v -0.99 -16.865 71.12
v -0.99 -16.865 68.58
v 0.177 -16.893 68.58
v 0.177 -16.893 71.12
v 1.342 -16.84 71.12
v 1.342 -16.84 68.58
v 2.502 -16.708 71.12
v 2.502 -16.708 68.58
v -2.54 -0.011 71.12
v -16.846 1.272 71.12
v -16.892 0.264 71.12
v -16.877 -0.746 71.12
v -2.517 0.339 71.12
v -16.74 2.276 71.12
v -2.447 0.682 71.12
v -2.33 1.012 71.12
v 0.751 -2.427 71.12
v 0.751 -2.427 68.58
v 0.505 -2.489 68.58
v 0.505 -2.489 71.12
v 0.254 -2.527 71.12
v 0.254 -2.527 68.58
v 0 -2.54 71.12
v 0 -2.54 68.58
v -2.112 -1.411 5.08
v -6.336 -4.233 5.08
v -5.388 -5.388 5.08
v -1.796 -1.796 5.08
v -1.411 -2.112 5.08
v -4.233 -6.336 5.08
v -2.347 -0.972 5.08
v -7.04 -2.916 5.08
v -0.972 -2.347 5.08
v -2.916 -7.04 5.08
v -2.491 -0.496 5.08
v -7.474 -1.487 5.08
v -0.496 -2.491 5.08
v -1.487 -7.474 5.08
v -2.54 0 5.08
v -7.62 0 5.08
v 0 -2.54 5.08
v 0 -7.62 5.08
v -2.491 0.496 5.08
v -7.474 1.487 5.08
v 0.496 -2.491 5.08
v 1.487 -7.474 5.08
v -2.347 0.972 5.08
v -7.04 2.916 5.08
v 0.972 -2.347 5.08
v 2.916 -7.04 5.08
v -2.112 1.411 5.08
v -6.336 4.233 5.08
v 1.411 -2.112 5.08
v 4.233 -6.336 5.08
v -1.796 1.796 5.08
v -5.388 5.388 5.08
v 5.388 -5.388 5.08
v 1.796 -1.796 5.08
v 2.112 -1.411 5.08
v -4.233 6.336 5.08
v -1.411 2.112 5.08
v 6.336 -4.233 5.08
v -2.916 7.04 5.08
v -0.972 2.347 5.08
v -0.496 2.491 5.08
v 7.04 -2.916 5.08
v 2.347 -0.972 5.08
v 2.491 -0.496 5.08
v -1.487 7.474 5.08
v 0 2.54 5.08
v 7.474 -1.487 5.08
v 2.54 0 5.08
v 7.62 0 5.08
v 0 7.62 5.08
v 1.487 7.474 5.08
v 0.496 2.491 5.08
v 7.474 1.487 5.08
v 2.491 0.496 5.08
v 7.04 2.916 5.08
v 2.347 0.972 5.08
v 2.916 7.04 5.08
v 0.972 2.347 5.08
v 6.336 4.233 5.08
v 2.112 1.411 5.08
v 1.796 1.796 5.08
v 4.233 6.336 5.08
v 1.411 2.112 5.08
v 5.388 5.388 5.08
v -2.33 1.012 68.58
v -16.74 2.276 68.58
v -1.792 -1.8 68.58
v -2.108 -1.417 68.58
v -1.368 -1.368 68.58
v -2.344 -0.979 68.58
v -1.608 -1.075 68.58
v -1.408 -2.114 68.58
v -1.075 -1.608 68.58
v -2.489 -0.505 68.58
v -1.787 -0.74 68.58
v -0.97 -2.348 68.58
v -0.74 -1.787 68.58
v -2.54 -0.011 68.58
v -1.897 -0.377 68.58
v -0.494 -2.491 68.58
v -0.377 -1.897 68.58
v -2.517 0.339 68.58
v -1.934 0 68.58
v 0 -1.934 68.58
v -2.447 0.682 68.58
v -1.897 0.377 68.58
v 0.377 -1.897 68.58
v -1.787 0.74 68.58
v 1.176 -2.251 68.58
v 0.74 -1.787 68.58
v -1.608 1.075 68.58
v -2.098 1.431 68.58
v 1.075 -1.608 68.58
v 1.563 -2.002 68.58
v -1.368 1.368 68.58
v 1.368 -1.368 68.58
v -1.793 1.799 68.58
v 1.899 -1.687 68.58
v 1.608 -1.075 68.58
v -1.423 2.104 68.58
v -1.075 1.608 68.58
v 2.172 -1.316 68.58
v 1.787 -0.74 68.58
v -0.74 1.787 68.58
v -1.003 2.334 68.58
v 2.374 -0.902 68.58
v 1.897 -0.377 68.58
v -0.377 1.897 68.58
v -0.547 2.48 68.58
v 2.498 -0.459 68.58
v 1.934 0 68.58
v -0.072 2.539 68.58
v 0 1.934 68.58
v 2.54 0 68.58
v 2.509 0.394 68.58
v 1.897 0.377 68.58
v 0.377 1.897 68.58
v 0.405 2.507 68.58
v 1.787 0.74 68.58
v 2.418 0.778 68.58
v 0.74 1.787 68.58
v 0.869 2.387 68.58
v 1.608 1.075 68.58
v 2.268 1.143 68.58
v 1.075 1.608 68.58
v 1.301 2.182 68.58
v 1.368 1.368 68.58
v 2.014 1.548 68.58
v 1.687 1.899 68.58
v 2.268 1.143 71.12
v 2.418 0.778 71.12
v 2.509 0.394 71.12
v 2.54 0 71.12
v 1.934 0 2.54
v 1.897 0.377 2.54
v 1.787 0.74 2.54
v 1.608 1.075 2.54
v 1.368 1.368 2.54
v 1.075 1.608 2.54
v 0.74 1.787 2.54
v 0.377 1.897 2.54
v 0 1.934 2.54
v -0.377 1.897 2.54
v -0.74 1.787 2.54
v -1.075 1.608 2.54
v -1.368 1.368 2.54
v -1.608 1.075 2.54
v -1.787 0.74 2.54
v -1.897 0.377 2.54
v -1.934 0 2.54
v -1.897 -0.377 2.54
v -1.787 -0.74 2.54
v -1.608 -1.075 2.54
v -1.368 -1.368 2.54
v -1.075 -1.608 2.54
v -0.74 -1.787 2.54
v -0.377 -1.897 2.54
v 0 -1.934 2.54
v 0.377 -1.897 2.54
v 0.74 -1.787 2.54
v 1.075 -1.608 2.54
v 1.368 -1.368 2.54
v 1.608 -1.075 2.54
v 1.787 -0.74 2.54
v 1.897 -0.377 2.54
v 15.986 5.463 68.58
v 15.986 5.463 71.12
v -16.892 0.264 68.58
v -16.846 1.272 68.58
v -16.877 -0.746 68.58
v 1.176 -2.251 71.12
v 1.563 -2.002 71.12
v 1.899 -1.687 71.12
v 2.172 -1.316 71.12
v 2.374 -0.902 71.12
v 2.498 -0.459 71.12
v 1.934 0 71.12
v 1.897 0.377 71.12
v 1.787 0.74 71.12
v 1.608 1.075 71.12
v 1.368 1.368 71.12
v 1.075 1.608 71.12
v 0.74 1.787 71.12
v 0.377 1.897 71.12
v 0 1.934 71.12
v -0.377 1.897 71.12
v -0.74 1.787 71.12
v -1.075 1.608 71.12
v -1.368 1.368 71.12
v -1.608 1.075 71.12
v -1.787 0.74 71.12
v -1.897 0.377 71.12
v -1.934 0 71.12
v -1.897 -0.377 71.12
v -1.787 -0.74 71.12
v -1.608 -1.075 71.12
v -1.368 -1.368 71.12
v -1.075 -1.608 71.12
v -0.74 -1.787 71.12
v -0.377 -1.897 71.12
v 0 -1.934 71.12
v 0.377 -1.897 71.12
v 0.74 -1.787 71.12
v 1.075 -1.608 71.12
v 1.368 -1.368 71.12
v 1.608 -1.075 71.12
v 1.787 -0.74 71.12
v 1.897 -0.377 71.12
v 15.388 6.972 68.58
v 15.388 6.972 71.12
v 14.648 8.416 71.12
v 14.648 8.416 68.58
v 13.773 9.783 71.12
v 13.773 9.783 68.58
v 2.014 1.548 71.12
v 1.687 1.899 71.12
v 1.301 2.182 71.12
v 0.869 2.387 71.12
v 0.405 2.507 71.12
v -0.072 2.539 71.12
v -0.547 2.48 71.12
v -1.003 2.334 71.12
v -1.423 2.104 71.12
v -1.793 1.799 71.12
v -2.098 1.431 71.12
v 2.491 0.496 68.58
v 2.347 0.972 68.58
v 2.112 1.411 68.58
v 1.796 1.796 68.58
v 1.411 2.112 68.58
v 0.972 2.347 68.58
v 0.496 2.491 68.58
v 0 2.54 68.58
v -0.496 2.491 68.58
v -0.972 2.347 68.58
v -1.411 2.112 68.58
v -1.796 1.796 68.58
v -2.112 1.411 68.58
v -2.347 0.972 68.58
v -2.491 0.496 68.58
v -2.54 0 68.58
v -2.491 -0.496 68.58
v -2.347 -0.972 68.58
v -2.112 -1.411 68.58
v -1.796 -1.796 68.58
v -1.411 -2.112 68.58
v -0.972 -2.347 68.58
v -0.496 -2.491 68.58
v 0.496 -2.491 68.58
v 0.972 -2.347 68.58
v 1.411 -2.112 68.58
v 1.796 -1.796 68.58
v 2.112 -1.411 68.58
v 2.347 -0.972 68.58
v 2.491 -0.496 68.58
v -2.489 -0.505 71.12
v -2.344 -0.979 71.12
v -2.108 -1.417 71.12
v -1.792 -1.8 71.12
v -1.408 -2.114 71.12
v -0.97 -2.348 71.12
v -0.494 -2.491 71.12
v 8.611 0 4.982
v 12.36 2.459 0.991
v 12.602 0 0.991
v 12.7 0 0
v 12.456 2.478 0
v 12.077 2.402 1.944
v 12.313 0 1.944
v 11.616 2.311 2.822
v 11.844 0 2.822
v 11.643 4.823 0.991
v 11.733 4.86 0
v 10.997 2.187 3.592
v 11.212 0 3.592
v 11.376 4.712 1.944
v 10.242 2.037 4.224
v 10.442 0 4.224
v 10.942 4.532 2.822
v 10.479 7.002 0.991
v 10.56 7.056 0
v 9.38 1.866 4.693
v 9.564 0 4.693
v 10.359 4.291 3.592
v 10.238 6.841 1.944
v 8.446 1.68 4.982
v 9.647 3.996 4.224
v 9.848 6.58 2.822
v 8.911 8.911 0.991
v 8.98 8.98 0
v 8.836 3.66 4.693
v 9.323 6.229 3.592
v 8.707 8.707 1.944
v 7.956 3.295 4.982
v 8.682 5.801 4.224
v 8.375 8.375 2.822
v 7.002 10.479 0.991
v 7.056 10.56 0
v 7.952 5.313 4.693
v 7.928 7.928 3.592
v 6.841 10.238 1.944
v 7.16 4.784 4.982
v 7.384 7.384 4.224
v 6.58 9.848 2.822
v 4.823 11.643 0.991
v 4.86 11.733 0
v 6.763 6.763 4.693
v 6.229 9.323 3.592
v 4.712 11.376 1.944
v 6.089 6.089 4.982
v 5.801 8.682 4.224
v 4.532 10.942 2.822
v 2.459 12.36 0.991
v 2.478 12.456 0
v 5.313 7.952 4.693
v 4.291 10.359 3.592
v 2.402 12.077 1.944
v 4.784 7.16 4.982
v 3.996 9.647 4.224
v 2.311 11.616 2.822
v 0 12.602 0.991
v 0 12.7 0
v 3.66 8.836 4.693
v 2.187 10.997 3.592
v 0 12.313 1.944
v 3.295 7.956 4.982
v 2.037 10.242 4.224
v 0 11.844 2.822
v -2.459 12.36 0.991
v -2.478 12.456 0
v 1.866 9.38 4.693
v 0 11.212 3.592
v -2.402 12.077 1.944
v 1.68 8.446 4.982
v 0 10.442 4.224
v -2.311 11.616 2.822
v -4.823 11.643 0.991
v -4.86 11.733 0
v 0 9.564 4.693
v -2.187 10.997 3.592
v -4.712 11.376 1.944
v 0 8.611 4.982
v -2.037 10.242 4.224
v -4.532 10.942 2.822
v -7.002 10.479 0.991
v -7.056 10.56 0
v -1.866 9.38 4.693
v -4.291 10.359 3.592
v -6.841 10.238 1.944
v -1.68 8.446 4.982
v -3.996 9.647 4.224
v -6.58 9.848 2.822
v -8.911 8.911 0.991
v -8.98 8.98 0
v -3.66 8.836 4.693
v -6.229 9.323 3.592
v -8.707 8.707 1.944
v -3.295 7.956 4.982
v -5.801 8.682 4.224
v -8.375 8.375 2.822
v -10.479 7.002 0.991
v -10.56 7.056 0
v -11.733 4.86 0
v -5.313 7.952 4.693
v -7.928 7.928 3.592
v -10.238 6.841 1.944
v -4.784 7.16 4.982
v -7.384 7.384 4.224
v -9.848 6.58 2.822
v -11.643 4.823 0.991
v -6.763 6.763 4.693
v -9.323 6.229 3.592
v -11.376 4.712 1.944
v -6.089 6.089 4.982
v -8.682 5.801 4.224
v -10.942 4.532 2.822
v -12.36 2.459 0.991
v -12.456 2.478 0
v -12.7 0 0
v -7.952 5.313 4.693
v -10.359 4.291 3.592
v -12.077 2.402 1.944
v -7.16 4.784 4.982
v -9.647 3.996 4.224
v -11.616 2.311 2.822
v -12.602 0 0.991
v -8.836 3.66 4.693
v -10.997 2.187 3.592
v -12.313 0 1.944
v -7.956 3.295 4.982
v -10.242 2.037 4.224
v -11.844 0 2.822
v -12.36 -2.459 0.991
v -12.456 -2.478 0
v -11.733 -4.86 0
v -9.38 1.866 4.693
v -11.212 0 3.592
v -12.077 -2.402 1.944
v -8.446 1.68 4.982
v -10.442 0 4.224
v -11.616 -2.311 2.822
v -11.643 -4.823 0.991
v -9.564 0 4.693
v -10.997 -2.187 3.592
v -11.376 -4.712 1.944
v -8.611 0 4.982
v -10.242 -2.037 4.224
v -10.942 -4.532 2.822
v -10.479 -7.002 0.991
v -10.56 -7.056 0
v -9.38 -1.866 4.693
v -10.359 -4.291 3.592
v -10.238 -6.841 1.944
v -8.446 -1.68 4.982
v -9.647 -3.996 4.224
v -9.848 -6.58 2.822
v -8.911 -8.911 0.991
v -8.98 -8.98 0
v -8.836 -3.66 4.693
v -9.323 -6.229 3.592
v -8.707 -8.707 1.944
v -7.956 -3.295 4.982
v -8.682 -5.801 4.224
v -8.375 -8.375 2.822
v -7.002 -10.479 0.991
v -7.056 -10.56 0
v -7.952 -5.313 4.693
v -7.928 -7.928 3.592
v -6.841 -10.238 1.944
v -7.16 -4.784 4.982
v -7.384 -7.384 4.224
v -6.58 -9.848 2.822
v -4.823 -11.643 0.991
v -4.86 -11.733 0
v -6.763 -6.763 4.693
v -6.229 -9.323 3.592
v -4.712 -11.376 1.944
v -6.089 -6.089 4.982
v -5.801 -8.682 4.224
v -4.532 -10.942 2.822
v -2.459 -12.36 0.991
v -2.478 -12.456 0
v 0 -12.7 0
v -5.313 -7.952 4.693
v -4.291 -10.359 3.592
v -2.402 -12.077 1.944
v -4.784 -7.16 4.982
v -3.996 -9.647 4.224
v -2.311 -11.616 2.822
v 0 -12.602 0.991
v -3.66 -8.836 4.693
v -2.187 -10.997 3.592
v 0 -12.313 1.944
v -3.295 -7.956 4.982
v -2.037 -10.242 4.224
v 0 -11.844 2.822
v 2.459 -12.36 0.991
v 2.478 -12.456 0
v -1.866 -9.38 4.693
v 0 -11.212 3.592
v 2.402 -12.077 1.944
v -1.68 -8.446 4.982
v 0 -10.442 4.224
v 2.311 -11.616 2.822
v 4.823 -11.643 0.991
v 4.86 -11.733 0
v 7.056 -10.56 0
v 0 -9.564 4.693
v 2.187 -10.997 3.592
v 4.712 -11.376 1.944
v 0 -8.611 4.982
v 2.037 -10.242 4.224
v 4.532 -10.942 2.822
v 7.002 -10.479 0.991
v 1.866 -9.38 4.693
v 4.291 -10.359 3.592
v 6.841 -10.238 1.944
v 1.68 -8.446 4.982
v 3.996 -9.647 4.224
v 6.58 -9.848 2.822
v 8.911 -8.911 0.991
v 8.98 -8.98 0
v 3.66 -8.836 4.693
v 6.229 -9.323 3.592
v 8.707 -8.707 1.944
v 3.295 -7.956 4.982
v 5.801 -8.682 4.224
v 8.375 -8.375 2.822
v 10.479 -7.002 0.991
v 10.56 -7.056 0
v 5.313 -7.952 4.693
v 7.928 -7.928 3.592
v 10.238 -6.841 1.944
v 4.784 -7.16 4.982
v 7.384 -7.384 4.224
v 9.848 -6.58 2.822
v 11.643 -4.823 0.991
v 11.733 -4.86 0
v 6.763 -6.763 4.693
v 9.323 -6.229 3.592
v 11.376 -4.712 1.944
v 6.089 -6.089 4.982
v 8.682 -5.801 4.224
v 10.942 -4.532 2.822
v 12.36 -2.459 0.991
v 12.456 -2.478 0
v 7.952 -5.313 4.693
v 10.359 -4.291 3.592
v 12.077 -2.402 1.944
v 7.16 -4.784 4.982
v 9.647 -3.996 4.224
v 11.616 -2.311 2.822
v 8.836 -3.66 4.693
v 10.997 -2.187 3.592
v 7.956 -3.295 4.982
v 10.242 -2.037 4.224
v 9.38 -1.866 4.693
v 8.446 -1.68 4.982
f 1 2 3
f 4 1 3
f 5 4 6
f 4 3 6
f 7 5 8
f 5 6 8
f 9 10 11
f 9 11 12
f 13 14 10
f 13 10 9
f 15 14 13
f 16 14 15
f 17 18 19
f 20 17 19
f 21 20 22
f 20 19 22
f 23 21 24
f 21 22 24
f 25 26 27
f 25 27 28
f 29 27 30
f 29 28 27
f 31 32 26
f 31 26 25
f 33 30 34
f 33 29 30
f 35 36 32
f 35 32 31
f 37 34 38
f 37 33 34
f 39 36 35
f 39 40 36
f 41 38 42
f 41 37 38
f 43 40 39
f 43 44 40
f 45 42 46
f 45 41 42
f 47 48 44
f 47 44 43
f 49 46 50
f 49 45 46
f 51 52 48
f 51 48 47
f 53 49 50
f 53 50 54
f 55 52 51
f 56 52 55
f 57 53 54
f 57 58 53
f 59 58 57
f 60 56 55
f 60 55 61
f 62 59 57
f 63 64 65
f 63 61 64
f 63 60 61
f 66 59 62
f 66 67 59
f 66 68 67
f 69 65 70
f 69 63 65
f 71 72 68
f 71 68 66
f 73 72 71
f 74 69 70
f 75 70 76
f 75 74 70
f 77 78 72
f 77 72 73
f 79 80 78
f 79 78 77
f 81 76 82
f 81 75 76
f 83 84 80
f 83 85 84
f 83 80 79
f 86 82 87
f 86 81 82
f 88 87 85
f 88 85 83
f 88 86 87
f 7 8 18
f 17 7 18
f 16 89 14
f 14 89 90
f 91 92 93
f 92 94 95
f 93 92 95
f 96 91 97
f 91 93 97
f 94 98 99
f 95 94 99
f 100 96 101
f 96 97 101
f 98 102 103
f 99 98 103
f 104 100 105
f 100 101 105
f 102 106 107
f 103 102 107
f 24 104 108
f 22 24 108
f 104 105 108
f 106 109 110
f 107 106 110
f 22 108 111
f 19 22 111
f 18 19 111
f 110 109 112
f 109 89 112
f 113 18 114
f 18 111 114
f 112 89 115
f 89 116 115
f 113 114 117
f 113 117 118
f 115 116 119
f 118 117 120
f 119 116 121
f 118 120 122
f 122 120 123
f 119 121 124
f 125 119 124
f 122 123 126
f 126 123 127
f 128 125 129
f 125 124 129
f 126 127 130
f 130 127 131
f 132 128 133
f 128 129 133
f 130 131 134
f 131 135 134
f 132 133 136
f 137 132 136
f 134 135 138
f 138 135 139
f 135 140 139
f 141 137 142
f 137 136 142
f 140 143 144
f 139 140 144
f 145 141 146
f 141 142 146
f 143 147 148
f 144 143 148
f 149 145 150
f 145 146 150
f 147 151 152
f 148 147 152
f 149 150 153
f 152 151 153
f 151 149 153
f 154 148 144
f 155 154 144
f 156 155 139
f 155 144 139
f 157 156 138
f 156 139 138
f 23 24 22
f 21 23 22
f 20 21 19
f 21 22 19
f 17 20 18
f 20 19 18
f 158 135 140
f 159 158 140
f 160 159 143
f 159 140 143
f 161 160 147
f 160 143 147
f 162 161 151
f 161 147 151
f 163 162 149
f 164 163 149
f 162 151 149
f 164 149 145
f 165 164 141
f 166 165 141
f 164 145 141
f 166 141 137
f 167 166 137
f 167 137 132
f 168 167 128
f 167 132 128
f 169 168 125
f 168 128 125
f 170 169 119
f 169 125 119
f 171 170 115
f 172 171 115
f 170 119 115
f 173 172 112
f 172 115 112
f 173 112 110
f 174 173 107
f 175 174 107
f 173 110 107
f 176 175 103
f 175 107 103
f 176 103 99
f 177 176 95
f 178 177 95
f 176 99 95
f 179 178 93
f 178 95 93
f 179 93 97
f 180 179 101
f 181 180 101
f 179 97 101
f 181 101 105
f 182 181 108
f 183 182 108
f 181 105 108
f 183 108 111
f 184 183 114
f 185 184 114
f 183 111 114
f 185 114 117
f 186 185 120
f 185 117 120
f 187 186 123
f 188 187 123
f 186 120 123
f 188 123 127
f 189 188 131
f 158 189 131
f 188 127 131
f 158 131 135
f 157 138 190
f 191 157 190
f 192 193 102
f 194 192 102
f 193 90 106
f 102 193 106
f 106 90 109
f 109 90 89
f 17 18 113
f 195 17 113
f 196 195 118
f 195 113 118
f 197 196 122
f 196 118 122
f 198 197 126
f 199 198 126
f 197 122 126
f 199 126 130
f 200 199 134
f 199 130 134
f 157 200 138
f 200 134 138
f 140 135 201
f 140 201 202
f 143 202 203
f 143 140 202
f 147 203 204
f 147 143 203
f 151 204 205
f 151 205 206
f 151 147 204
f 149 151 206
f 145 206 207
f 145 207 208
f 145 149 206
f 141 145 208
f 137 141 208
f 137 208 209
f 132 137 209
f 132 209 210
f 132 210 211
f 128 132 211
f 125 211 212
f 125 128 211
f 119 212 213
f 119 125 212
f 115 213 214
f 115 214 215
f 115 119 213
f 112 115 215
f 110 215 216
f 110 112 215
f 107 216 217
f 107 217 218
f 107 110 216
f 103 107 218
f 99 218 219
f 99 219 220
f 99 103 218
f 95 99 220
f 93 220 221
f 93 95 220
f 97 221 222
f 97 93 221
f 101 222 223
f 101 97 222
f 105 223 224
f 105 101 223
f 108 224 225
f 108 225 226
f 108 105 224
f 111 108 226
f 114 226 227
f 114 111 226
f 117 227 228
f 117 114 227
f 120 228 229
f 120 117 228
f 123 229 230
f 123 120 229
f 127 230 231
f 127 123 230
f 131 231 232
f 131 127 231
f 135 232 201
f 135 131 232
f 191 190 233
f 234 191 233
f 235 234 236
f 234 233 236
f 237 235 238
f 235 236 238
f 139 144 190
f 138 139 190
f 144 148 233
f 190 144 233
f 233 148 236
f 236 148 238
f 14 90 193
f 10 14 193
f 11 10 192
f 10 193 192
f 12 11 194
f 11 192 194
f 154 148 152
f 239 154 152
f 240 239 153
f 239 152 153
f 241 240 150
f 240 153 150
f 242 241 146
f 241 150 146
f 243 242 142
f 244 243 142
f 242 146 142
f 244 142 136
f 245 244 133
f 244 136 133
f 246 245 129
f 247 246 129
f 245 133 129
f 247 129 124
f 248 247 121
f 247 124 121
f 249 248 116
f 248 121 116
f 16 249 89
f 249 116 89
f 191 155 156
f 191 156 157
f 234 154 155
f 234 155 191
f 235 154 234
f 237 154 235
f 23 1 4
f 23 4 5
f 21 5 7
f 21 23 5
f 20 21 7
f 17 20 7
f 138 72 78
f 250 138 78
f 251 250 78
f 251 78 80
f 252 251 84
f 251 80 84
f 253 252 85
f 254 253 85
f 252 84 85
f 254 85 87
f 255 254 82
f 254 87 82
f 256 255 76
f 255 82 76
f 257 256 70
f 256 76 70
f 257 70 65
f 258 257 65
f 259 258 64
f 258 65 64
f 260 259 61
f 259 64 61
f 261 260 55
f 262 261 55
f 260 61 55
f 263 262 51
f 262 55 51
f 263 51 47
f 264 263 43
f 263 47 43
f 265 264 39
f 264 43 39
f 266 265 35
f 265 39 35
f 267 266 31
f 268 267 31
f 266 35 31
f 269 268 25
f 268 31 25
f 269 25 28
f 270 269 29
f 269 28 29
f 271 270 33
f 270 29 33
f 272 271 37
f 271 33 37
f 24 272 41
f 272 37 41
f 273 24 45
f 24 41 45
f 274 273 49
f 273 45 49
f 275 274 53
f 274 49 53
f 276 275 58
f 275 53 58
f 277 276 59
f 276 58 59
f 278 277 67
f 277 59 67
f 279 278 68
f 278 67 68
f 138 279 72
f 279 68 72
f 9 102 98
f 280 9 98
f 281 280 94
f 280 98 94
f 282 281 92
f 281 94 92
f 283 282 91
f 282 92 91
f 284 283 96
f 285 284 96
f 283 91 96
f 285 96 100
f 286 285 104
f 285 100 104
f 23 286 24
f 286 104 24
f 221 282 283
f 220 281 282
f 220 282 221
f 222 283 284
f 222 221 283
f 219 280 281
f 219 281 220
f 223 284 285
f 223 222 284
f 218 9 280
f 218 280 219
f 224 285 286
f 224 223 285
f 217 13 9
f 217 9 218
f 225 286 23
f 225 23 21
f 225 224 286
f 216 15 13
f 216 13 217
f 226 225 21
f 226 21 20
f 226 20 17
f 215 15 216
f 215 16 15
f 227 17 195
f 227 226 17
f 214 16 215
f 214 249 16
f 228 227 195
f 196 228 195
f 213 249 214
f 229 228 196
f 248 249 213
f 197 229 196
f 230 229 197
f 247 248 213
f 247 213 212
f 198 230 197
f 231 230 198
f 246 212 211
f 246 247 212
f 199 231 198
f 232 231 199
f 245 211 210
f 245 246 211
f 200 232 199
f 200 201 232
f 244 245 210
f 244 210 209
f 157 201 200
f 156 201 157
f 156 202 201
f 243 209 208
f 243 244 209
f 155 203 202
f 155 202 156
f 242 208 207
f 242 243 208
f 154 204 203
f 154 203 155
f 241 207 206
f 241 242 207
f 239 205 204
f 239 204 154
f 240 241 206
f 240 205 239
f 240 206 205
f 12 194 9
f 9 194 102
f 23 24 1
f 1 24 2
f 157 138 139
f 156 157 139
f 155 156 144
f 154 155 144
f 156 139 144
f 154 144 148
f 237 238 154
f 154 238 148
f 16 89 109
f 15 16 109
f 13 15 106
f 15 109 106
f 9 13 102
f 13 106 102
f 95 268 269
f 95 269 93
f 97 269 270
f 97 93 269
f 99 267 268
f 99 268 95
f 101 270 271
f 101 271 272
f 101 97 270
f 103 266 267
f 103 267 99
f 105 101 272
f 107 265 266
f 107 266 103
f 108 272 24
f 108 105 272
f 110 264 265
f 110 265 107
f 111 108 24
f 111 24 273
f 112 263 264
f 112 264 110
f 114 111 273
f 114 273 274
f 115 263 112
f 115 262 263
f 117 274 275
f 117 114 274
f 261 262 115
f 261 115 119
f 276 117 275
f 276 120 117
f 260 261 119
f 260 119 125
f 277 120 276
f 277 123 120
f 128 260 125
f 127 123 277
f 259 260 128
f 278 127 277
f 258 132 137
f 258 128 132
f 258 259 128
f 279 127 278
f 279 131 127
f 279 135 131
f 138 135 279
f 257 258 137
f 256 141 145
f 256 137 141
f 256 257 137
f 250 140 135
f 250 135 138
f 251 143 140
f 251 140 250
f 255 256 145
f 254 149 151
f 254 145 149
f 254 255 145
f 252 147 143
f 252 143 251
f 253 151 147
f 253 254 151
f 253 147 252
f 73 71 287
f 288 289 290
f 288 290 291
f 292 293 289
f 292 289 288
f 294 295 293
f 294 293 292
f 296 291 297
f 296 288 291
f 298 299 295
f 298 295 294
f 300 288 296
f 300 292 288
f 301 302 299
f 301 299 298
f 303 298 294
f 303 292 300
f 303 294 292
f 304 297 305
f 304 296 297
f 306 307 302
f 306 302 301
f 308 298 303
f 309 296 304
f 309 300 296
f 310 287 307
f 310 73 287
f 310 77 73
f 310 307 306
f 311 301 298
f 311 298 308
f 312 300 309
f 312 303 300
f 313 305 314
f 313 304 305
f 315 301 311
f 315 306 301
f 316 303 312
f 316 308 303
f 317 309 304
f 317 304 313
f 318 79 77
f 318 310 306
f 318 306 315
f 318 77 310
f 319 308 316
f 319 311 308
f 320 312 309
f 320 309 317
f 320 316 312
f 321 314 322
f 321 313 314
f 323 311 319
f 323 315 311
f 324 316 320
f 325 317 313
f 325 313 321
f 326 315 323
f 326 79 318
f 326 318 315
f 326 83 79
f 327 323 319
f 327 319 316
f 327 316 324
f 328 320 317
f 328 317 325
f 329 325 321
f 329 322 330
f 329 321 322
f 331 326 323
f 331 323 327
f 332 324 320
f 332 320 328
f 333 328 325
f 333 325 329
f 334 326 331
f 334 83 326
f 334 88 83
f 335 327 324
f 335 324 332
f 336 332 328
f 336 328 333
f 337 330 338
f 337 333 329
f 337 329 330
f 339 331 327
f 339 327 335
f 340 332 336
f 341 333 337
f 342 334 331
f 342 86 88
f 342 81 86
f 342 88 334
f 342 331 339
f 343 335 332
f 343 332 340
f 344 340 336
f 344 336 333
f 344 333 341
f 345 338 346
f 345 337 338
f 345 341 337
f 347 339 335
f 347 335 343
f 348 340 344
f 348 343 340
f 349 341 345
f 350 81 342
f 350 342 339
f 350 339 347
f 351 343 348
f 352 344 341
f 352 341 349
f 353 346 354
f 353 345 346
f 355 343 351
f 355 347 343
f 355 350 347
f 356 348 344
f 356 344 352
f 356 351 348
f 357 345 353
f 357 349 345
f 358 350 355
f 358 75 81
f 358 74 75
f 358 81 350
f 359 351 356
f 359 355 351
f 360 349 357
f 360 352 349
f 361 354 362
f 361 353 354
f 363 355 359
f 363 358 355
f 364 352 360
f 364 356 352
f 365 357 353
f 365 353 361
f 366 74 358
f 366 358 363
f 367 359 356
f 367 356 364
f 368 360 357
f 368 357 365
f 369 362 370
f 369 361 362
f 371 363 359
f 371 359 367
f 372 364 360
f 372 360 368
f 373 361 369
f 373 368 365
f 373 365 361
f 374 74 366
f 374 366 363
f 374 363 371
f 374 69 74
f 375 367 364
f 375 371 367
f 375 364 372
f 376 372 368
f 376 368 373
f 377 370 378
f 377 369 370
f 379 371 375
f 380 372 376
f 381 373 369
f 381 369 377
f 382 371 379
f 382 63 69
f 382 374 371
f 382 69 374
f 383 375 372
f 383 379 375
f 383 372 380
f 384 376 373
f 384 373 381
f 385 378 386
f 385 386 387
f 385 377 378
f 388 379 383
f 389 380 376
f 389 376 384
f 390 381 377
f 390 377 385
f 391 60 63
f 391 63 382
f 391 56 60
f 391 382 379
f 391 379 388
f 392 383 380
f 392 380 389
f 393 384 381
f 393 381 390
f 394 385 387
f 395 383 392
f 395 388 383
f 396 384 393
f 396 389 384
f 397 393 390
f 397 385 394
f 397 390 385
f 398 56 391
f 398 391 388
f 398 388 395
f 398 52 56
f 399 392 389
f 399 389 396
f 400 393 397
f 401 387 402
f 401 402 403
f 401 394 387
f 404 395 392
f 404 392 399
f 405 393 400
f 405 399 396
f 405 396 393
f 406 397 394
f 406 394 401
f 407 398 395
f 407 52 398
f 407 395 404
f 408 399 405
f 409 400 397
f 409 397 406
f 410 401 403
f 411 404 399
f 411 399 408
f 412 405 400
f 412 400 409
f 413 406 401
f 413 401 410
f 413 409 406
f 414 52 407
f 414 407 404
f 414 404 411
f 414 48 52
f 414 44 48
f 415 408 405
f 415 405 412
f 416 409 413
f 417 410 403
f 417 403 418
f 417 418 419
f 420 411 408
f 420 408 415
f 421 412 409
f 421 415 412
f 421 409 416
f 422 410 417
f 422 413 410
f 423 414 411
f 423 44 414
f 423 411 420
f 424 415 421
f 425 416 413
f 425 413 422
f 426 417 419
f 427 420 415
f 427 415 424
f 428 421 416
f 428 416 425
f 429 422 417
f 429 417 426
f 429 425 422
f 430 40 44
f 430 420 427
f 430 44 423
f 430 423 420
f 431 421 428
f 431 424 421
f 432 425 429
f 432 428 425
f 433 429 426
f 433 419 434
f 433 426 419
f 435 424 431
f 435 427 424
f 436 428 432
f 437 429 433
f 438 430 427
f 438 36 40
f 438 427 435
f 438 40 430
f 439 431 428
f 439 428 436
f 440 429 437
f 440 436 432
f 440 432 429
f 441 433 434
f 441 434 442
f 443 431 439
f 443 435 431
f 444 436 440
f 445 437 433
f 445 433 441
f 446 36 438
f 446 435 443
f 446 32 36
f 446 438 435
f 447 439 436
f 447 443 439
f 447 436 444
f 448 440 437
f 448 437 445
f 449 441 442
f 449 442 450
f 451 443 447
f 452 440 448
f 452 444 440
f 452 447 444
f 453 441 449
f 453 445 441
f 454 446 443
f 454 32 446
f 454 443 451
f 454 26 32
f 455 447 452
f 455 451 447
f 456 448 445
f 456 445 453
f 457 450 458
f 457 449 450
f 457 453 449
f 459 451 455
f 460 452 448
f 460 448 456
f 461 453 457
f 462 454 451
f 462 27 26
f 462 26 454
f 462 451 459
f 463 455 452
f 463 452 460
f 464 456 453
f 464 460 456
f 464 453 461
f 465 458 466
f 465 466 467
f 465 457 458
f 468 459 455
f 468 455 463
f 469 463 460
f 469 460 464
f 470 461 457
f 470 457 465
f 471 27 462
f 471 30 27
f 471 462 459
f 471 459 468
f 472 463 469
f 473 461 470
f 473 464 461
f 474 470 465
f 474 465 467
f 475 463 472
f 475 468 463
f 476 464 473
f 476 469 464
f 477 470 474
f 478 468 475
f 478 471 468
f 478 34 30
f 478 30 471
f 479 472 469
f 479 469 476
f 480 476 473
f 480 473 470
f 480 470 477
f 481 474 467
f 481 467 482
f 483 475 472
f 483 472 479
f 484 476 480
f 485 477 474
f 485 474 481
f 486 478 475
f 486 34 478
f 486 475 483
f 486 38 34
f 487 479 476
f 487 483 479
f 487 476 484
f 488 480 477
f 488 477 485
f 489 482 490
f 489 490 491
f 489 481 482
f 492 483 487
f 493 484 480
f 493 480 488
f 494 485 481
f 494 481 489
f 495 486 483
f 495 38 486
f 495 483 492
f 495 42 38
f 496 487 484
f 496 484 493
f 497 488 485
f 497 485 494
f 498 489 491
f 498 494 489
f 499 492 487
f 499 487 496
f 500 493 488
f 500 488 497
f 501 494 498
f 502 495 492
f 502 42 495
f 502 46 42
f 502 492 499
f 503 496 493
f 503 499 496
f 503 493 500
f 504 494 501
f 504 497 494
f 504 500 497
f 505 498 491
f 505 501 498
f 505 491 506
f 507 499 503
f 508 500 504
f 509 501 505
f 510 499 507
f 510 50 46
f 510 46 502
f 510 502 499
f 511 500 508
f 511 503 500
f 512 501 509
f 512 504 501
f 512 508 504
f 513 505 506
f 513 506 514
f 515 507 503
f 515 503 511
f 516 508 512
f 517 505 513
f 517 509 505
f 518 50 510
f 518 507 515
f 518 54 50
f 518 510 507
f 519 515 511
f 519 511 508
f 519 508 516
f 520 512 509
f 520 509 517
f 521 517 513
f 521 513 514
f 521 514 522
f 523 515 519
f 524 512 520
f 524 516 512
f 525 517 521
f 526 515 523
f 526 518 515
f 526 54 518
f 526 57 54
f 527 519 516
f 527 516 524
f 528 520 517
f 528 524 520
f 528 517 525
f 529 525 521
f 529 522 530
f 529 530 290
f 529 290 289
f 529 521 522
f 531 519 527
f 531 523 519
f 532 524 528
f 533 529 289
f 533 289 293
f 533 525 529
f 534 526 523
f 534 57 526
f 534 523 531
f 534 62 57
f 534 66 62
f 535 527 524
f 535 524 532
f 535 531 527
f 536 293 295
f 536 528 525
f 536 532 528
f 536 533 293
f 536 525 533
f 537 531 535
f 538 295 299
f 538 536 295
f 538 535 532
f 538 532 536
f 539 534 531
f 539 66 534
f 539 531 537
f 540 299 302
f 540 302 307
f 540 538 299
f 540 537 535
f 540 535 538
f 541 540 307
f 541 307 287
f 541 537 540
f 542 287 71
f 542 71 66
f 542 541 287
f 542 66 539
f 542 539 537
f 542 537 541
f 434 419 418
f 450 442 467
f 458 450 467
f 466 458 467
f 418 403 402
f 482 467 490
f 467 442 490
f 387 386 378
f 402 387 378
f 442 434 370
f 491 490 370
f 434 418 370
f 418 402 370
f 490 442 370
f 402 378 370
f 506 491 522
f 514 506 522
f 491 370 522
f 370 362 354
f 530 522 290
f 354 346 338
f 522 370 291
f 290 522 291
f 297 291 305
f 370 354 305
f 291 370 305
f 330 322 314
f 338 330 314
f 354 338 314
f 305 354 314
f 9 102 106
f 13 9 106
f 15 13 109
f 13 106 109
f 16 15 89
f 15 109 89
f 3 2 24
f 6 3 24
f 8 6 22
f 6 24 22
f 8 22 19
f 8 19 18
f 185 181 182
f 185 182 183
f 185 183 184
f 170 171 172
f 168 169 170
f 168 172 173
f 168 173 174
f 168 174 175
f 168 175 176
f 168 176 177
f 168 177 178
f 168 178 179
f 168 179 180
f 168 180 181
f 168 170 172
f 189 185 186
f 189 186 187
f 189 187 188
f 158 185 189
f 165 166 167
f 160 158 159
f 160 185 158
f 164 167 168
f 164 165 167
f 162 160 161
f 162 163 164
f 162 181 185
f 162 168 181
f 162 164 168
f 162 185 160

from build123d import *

# Parameters (mm, degrees)
F0_R      = 12.7
F1_DEPTH  = 5.08
F2_R      = 2.54
F3_DEPTH  = 63.5
F4_R      = 1.9341022534
F5_DEPTH  = 66.04
F7_R      = 5.07999
F8_DEPTH  = 2.54
F9_DEPTH  = 2.54
F10_DEPTH = 2.54


# Not quite as in the source:
# - a fillet or chamfer is up to 0.001 mm smaller than in the source, because OpenCascade refuses the exact size
# - the program builds the solid bodies; features that only make, move or delete a surface that nothing else refers to are left out


with BuildPart() as f1:
    # F0 (on Top) → F1 (new body)
    with BuildSketch(Plane.XY):
        Circle(F0_R)
    extrude(amount=F1_DEPTH)

    # F2 (on face) → F3 (join)
    with BuildSketch(Plane.XY.offset(5.08)):
        Circle(F2_R)
    extrude(amount=F3_DEPTH)

    # F4 (on face) → F5 (cut)
    with BuildSketch(Plane.XY.offset(68.58)):
        Circle(F4_R)
    extrude(amount=-F5_DEPTH, mode=Mode.SUBTRACT)

    # F7 (radius 5.08 in the source; OpenCascade refuses exactly that, so slightly less here)
    f7_edges = [f1.edges().sort_by_distance(p)[0] for p in [
        (-12.7, 0, 5.08),
    ]]
    fillet(f7_edges, radius=F7_R)


with BuildPart() as f8:
    # F4 (on face) → F8 (new body)
    with BuildSketch(Plane.XY.offset(68.58)):
        with BuildLine():
            Line((-2.3296703372, 1.0120455128), (-16.7398383993, 2.2762761567))
            ThreePointArc((-16.7398383993, 2.2762761567), (-16.876419297, 0.7681760801), (-16.8774098693, -0.7460957586))
            Line((-16.8774098693, -0.7460957586), (-2.5399770996, -0.0107857982))
            ThreePointArc((-2.5399770996, -0.0107857982), (-2.4879534787, 0.5115539928), (-2.3296703372, 1.0120455128))
        make_face()
    extrude(amount=F8_DEPTH)


with BuildPart() as f9:
    # F4 (on face) → F9 (new body)
    with BuildSketch(Plane.XY.offset(68.58)):
        with BuildLine():
            Line((2.54, 0), (15.9862067387, 5.4630409925))
            ThreePointArc((15.9862067387, 5.4630409925), (15.0355746118, 7.7029292395), (13.7730240822, 9.7830174491))
            Line((13.7730240822, 9.7830174491), (2.2682600086, 1.143064536))
            ThreePointArc((2.2682600086, 1.143064536), (2.4711313625, 0.5874604575), (2.54, 0))
        make_face()
    extrude(amount=F9_DEPTH)


with BuildPart() as f9b:
    # F4 (on face) → F9, piece 2 (new body)
    with BuildSketch(Plane.XY.offset(68.58)):
        with BuildLine():
            ThreePointArc((-0.990063935, -16.8648568385), (0.7598975693, -16.8767940813), (2.5017050348, -16.7076358201))
            Line((2.5017050348, -16.7076358201), (0.750540077, -2.4265798138))
            ThreePointArc((0.750540077, -2.4265798138), (0.3795308109, -2.5114848922), (0, -2.54))
            Line((0, -2.54), (-0.990063935, -16.8648568385))
        make_face()
    extrude(amount=F9_DEPTH)


with BuildPart() as f10:
    # F4 (on face) → F10 (new body)
    with BuildSketch(Plane.XY.offset(68.58)):
        with BuildLine():
            ThreePointArc((0.750540077, -2.4265798138), (2.0442568082, -1.507519188), (2.54, 0))
            ThreePointArc((2.54, 0), (2.4711313625, 0.5874604575), (2.2682600086, 1.143064536))
            ThreePointArc((2.2682600086, 1.143064536), (-0.0723484846, 2.5389694163), (-2.3296703372, 1.0120455128))
            ThreePointArc((-2.3296703372, 1.0120455128), (-2.4879534787, 0.5115539928), (-2.5399770996, -0.0107857982))
            ThreePointArc((-2.5399770996, -0.0107857982), (-1.7922338118, -1.7998605401), (0, -2.54))
            ThreePointArc((0, -2.54), (0.3795308109, -2.5114848922), (0.750540077, -2.4265798138))
        make_face()
        Circle(F4_R, mode=Mode.SUBTRACT)
    extrude(amount=F10_DEPTH)


solid = Compound([f1.part, f8.part, f9.part, f9b.part, f10.part])
